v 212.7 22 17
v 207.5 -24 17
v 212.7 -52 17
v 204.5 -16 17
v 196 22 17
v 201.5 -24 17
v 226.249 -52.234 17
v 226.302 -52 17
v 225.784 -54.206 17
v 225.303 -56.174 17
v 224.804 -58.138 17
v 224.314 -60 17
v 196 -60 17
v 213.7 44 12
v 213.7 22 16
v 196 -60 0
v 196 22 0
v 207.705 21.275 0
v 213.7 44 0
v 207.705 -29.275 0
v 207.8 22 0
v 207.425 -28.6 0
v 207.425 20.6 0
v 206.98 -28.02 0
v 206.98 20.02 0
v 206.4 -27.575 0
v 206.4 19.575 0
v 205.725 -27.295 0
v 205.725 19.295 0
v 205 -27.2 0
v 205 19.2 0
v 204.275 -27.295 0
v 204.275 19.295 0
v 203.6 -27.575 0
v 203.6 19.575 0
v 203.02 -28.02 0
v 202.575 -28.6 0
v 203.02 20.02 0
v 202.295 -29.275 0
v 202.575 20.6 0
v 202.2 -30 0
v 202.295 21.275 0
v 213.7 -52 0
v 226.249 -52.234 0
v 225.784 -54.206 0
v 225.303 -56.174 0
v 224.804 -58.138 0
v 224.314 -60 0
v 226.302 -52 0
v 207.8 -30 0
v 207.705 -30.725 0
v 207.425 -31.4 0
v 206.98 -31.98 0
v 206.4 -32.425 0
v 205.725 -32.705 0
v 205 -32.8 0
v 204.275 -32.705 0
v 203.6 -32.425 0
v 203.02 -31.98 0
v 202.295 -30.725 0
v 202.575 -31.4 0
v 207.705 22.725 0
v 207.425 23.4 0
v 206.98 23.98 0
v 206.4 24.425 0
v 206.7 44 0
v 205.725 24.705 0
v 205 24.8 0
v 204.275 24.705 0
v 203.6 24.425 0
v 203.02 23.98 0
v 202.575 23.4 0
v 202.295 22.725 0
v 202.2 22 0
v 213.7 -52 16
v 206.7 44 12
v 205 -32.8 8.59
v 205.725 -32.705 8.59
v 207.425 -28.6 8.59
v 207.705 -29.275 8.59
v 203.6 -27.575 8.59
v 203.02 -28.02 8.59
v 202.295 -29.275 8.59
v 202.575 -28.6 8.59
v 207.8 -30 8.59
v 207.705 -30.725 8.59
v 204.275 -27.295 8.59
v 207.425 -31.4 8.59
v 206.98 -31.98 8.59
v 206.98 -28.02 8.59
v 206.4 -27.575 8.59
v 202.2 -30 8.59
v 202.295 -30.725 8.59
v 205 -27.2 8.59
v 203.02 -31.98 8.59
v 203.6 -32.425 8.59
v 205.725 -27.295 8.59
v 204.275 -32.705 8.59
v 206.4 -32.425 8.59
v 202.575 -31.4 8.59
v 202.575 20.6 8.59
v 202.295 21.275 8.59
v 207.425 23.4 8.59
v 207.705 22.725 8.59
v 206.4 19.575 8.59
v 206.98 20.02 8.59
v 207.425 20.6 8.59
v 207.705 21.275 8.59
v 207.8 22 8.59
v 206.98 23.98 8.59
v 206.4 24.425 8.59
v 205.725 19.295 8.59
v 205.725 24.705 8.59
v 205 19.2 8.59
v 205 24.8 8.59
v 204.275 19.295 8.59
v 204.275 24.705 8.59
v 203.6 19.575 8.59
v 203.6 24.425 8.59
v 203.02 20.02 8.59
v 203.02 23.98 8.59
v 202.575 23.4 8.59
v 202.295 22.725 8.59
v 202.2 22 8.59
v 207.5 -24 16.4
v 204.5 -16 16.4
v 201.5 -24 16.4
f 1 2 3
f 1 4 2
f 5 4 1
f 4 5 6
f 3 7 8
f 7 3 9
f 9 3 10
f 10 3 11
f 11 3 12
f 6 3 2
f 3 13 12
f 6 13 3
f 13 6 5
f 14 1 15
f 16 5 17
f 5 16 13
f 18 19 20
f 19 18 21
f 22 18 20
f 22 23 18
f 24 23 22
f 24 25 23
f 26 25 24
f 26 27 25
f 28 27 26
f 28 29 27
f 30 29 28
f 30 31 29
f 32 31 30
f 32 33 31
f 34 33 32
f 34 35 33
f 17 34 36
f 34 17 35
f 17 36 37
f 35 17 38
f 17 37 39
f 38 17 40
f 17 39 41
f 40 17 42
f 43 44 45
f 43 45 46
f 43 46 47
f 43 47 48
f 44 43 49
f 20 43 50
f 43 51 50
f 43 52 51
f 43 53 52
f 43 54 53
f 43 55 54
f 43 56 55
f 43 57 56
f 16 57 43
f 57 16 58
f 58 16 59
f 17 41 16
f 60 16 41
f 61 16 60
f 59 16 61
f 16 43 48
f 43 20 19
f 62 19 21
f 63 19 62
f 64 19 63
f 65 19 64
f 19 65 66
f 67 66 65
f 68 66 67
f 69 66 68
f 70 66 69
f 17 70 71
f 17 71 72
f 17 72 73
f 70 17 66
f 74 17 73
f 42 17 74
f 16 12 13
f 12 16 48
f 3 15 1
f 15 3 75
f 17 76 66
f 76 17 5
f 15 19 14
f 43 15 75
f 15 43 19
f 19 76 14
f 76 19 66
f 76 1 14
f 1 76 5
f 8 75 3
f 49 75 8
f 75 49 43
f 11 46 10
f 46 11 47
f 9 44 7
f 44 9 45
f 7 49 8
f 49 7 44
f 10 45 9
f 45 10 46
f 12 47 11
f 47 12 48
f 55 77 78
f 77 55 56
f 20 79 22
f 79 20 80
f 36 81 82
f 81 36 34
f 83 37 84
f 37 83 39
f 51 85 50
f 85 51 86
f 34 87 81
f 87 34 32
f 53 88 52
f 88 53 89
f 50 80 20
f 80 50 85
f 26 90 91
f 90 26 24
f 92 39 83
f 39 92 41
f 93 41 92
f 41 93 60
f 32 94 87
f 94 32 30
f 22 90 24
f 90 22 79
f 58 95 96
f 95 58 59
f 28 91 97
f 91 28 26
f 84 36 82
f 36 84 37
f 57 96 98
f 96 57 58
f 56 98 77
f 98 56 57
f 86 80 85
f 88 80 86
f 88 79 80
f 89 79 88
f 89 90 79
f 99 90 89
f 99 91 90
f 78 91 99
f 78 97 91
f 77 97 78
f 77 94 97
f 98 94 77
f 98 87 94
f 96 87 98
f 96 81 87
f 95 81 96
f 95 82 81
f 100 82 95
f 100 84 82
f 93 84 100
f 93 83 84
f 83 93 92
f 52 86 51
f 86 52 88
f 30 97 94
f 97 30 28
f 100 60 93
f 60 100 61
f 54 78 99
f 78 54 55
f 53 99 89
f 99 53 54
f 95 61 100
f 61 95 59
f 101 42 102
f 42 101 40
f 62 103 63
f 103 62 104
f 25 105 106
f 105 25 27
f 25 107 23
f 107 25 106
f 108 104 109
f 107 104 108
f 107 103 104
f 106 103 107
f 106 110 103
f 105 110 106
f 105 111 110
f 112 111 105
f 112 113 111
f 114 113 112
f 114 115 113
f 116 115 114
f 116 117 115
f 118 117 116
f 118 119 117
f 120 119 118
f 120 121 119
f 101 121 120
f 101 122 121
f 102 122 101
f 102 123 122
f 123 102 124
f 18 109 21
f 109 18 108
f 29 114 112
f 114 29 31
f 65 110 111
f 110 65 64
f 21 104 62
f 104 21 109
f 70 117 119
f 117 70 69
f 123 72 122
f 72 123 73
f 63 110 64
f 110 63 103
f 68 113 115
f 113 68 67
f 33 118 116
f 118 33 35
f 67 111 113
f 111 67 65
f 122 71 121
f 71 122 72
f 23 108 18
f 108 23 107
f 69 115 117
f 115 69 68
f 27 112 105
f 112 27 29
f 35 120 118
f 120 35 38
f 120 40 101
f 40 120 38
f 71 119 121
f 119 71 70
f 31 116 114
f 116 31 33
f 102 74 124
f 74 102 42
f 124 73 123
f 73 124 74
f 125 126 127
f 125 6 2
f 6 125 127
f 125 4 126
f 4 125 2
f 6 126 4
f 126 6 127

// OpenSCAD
// =====================================================================
//  Druckteile in Druckausrichtung (stuetzfrei, auf z=0, Bett 256x256)
//  openscad -D 'PART="haken"' -o haken.stl print.scad
//  Liste aller Teile: PARTS (wird von tools/build_parts.py verwendet)
// =====================================================================
include <config.scad>
include <lib/basics.scad>
include <parts/gutter.scad>
include <parts/teller.scad>
include <parts/rotor.scad>
include <parts/misc.scad>

PART = "haken";

// [Name, Anzahl, Material, Hinweis]
PARTS = [
 ["haken",             10, "PETG", "flach, 5 Waende, 40% Fuellung (Mitnehmer)"],
 ["nabe",               1, "PETG", "Rueckseite unten, 6 Waende, 60% Fuellung"],
 ["lagerbock_teller",   1, "PETG", "Flansch unten, 5 Waende, 40% Fuellung"],
 ["randring_1",         1, "PETG", "Fuss unten"],
 ["randring_2",         1, "PETG", "Fuss unten"],
 ["randring_3",         1, "PETG", "Fuss unten"],
 ["randring_4",         1, "PETG", "Fuss unten"],
 ["randring_5",         1, "PETG", "Fuss unten"],
 ["randring_6",         1, "PETG", "Fuss unten"],
 ["kantenwinkel_1",     4, "PETG", "Kante unten"],
 ["kantenwinkel_2",     4, "PETG", "Kante unten"],
 ["bodenauflage",       2, "PETG", "Holmseite unten"],
 ["abstreifer",         1, "PETG", "Aussenende unten"],
 ["uebergabe",          1, "PETG", "Rinnenlage (Kiel unten), Gleitflaechen 0.15 mm Schicht"],
 ["auslauf",            1, "PETG", "Kiel unten"],
 ["deckel_auslauf",     1, "PETG", "flach (transparentes PETG empfohlen)"],
 ["haubenhalter",       4, "PETG", "stehend"],
 ["keil_teller",        4, "PETG", "flach, 60% Fuellung"],
 ["rinne_G1",           1, "PETG", "auf Kiel"],
 ["rinne_G2",           1, "PETG", "auf Kiel"],
 ["deckel_G1",          1, "PETG", "flach (transparentes PETG empfohlen)"],
 ["deckel_G2",          1, "PETG", "flach"],
 ["klemmbock",          1, "PETG", "Platte unten"],
 ["klemmstempel",       1, "PETG", ""],
 ["klemmpad",           1, "TPU 95A", "unter Stempel kleben"],
 ["sperrkonsole",       1, "PETG", "Zylinderplatte unten"],
 ["sperrstift",         1, "PETG", "stehend, M4 schneiden"],
 ["rotor_motorseite",   1, "PETG", "Trennflaeche unten, 100% Waende um Nabe"],
 ["rotor_lagerseite",   1, "PETG", "Trennflaeche unten"],
 ["gehaeuse_motorseite",1, "PETG", "Aussenplatte unten"],
 ["gehaeuse_lagerseite",1, "PETG", "Aussenplatte unten"],
 ["motorstutzen",       1, "PETG", "Motorseite unten"],
 ["fallschacht",        1, "PETG", "Flansch unten"],
 ["sensorhalter_laser", 5, "PETG schwarz", "Grundplatte unten"],
 ["sensorhalter_pt",    5, "PETG schwarz", "Grundplatte unten"],
 ["e18_halter",         1, "PETG", "auf Steg liegend"],
];

// Nur Drehungen; tools/build_parts.py legt jedes Teil auf z=0 und zentriert es.
module D_world_rot() multmatrix([[F_U[0], Dv2w([0,1,0])[0], Dv2w([0,0,1])[0], 0],
                                 [F_U[1], Dv2w([0,1,0])[1], Dv2w([0,0,1])[1], 0],
                                 [F_U[2], Dv2w([0,1,0])[2], Dv2w([0,0,1])[2], 0], [0,0,0,1]]) children();
module print_part(name) {
    if (name == "haken") haken();                                         // Tellerseite unten
    if (name == "nabe") nabe();                                           // Rueckseite (Muttern, Magnete) unten
    if (name == "lagerbock_teller") rotate([180,0,0]) lagerbock_teller(); // Flansch unten
    for (s=[0:5]) if (name == str("randring_", s + 1)) randring(s);       // Fuss unten
    if (name == "kantenwinkel_1") rotate([0,180,0]) kantenwinkel(kw_dihedral(0));
    if (name == "kantenwinkel_2") rotate([0,180,0]) kantenwinkel(kw_dihedral(1));
    if (name == "bodenauflage") D_world_rot() bodenauflage_at(BA_X[1]);  // Weltlage: Holmseite waagerecht unten
    if (name == "abstreifer") rotate([0,90,0]) rotate([0,0,-STRIP_A]) abstreifer();   // Aussenende unten
    if (name == "uebergabe") uebergabe();                                 // Rinnenlage
    if (name == "auslauf") auslauf();
    if (name == "deckel_auslauf") deckel_auslauf();
    if (name == "haubenhalter") haubenhalter();
    if (name == "keil_teller") keil(TD_INCL);
    if (name == "rinne_G1") rinne_G1();
    if (name == "rinne_G2") rinne_G2();
    if (name == "deckel_G1") deckel_G1();
    if (name == "deckel_G2") deckel_G2();
    if (name == "klemmbock") rotate([180,0,0]) klemmbock();
    if (name == "klemmstempel") klemmstempel();
    if (name == "klemmpad") klemmpad();
    if (name == "sperrkonsole") sperrkonsole();
    if (name == "sperrstift") sperrstift();
    if (name == "rotor_motorseite") rotate([180,0,0]) rotor_motorseite();
    if (name == "rotor_lagerseite") rotor_lagerseite();
    if (name == "gehaeuse_motorseite") gehaeuse_motorseite();
    if (name == "gehaeuse_lagerseite") rotate([180,0,0]) gehaeuse_lagerseite();
    if (name == "motorstutzen") motorstutzen();
    if (name == "fallschacht") rotate([180,0,0]) fallschacht();
    if (name == "sensorhalter_laser") sensorhalter_laser();
    if (name == "sensorhalter_pt") sensorhalter_pt();
    if (name == "e18_halter") rotate([-90,0,0]) e18_halter();
}

print_part(PART);
